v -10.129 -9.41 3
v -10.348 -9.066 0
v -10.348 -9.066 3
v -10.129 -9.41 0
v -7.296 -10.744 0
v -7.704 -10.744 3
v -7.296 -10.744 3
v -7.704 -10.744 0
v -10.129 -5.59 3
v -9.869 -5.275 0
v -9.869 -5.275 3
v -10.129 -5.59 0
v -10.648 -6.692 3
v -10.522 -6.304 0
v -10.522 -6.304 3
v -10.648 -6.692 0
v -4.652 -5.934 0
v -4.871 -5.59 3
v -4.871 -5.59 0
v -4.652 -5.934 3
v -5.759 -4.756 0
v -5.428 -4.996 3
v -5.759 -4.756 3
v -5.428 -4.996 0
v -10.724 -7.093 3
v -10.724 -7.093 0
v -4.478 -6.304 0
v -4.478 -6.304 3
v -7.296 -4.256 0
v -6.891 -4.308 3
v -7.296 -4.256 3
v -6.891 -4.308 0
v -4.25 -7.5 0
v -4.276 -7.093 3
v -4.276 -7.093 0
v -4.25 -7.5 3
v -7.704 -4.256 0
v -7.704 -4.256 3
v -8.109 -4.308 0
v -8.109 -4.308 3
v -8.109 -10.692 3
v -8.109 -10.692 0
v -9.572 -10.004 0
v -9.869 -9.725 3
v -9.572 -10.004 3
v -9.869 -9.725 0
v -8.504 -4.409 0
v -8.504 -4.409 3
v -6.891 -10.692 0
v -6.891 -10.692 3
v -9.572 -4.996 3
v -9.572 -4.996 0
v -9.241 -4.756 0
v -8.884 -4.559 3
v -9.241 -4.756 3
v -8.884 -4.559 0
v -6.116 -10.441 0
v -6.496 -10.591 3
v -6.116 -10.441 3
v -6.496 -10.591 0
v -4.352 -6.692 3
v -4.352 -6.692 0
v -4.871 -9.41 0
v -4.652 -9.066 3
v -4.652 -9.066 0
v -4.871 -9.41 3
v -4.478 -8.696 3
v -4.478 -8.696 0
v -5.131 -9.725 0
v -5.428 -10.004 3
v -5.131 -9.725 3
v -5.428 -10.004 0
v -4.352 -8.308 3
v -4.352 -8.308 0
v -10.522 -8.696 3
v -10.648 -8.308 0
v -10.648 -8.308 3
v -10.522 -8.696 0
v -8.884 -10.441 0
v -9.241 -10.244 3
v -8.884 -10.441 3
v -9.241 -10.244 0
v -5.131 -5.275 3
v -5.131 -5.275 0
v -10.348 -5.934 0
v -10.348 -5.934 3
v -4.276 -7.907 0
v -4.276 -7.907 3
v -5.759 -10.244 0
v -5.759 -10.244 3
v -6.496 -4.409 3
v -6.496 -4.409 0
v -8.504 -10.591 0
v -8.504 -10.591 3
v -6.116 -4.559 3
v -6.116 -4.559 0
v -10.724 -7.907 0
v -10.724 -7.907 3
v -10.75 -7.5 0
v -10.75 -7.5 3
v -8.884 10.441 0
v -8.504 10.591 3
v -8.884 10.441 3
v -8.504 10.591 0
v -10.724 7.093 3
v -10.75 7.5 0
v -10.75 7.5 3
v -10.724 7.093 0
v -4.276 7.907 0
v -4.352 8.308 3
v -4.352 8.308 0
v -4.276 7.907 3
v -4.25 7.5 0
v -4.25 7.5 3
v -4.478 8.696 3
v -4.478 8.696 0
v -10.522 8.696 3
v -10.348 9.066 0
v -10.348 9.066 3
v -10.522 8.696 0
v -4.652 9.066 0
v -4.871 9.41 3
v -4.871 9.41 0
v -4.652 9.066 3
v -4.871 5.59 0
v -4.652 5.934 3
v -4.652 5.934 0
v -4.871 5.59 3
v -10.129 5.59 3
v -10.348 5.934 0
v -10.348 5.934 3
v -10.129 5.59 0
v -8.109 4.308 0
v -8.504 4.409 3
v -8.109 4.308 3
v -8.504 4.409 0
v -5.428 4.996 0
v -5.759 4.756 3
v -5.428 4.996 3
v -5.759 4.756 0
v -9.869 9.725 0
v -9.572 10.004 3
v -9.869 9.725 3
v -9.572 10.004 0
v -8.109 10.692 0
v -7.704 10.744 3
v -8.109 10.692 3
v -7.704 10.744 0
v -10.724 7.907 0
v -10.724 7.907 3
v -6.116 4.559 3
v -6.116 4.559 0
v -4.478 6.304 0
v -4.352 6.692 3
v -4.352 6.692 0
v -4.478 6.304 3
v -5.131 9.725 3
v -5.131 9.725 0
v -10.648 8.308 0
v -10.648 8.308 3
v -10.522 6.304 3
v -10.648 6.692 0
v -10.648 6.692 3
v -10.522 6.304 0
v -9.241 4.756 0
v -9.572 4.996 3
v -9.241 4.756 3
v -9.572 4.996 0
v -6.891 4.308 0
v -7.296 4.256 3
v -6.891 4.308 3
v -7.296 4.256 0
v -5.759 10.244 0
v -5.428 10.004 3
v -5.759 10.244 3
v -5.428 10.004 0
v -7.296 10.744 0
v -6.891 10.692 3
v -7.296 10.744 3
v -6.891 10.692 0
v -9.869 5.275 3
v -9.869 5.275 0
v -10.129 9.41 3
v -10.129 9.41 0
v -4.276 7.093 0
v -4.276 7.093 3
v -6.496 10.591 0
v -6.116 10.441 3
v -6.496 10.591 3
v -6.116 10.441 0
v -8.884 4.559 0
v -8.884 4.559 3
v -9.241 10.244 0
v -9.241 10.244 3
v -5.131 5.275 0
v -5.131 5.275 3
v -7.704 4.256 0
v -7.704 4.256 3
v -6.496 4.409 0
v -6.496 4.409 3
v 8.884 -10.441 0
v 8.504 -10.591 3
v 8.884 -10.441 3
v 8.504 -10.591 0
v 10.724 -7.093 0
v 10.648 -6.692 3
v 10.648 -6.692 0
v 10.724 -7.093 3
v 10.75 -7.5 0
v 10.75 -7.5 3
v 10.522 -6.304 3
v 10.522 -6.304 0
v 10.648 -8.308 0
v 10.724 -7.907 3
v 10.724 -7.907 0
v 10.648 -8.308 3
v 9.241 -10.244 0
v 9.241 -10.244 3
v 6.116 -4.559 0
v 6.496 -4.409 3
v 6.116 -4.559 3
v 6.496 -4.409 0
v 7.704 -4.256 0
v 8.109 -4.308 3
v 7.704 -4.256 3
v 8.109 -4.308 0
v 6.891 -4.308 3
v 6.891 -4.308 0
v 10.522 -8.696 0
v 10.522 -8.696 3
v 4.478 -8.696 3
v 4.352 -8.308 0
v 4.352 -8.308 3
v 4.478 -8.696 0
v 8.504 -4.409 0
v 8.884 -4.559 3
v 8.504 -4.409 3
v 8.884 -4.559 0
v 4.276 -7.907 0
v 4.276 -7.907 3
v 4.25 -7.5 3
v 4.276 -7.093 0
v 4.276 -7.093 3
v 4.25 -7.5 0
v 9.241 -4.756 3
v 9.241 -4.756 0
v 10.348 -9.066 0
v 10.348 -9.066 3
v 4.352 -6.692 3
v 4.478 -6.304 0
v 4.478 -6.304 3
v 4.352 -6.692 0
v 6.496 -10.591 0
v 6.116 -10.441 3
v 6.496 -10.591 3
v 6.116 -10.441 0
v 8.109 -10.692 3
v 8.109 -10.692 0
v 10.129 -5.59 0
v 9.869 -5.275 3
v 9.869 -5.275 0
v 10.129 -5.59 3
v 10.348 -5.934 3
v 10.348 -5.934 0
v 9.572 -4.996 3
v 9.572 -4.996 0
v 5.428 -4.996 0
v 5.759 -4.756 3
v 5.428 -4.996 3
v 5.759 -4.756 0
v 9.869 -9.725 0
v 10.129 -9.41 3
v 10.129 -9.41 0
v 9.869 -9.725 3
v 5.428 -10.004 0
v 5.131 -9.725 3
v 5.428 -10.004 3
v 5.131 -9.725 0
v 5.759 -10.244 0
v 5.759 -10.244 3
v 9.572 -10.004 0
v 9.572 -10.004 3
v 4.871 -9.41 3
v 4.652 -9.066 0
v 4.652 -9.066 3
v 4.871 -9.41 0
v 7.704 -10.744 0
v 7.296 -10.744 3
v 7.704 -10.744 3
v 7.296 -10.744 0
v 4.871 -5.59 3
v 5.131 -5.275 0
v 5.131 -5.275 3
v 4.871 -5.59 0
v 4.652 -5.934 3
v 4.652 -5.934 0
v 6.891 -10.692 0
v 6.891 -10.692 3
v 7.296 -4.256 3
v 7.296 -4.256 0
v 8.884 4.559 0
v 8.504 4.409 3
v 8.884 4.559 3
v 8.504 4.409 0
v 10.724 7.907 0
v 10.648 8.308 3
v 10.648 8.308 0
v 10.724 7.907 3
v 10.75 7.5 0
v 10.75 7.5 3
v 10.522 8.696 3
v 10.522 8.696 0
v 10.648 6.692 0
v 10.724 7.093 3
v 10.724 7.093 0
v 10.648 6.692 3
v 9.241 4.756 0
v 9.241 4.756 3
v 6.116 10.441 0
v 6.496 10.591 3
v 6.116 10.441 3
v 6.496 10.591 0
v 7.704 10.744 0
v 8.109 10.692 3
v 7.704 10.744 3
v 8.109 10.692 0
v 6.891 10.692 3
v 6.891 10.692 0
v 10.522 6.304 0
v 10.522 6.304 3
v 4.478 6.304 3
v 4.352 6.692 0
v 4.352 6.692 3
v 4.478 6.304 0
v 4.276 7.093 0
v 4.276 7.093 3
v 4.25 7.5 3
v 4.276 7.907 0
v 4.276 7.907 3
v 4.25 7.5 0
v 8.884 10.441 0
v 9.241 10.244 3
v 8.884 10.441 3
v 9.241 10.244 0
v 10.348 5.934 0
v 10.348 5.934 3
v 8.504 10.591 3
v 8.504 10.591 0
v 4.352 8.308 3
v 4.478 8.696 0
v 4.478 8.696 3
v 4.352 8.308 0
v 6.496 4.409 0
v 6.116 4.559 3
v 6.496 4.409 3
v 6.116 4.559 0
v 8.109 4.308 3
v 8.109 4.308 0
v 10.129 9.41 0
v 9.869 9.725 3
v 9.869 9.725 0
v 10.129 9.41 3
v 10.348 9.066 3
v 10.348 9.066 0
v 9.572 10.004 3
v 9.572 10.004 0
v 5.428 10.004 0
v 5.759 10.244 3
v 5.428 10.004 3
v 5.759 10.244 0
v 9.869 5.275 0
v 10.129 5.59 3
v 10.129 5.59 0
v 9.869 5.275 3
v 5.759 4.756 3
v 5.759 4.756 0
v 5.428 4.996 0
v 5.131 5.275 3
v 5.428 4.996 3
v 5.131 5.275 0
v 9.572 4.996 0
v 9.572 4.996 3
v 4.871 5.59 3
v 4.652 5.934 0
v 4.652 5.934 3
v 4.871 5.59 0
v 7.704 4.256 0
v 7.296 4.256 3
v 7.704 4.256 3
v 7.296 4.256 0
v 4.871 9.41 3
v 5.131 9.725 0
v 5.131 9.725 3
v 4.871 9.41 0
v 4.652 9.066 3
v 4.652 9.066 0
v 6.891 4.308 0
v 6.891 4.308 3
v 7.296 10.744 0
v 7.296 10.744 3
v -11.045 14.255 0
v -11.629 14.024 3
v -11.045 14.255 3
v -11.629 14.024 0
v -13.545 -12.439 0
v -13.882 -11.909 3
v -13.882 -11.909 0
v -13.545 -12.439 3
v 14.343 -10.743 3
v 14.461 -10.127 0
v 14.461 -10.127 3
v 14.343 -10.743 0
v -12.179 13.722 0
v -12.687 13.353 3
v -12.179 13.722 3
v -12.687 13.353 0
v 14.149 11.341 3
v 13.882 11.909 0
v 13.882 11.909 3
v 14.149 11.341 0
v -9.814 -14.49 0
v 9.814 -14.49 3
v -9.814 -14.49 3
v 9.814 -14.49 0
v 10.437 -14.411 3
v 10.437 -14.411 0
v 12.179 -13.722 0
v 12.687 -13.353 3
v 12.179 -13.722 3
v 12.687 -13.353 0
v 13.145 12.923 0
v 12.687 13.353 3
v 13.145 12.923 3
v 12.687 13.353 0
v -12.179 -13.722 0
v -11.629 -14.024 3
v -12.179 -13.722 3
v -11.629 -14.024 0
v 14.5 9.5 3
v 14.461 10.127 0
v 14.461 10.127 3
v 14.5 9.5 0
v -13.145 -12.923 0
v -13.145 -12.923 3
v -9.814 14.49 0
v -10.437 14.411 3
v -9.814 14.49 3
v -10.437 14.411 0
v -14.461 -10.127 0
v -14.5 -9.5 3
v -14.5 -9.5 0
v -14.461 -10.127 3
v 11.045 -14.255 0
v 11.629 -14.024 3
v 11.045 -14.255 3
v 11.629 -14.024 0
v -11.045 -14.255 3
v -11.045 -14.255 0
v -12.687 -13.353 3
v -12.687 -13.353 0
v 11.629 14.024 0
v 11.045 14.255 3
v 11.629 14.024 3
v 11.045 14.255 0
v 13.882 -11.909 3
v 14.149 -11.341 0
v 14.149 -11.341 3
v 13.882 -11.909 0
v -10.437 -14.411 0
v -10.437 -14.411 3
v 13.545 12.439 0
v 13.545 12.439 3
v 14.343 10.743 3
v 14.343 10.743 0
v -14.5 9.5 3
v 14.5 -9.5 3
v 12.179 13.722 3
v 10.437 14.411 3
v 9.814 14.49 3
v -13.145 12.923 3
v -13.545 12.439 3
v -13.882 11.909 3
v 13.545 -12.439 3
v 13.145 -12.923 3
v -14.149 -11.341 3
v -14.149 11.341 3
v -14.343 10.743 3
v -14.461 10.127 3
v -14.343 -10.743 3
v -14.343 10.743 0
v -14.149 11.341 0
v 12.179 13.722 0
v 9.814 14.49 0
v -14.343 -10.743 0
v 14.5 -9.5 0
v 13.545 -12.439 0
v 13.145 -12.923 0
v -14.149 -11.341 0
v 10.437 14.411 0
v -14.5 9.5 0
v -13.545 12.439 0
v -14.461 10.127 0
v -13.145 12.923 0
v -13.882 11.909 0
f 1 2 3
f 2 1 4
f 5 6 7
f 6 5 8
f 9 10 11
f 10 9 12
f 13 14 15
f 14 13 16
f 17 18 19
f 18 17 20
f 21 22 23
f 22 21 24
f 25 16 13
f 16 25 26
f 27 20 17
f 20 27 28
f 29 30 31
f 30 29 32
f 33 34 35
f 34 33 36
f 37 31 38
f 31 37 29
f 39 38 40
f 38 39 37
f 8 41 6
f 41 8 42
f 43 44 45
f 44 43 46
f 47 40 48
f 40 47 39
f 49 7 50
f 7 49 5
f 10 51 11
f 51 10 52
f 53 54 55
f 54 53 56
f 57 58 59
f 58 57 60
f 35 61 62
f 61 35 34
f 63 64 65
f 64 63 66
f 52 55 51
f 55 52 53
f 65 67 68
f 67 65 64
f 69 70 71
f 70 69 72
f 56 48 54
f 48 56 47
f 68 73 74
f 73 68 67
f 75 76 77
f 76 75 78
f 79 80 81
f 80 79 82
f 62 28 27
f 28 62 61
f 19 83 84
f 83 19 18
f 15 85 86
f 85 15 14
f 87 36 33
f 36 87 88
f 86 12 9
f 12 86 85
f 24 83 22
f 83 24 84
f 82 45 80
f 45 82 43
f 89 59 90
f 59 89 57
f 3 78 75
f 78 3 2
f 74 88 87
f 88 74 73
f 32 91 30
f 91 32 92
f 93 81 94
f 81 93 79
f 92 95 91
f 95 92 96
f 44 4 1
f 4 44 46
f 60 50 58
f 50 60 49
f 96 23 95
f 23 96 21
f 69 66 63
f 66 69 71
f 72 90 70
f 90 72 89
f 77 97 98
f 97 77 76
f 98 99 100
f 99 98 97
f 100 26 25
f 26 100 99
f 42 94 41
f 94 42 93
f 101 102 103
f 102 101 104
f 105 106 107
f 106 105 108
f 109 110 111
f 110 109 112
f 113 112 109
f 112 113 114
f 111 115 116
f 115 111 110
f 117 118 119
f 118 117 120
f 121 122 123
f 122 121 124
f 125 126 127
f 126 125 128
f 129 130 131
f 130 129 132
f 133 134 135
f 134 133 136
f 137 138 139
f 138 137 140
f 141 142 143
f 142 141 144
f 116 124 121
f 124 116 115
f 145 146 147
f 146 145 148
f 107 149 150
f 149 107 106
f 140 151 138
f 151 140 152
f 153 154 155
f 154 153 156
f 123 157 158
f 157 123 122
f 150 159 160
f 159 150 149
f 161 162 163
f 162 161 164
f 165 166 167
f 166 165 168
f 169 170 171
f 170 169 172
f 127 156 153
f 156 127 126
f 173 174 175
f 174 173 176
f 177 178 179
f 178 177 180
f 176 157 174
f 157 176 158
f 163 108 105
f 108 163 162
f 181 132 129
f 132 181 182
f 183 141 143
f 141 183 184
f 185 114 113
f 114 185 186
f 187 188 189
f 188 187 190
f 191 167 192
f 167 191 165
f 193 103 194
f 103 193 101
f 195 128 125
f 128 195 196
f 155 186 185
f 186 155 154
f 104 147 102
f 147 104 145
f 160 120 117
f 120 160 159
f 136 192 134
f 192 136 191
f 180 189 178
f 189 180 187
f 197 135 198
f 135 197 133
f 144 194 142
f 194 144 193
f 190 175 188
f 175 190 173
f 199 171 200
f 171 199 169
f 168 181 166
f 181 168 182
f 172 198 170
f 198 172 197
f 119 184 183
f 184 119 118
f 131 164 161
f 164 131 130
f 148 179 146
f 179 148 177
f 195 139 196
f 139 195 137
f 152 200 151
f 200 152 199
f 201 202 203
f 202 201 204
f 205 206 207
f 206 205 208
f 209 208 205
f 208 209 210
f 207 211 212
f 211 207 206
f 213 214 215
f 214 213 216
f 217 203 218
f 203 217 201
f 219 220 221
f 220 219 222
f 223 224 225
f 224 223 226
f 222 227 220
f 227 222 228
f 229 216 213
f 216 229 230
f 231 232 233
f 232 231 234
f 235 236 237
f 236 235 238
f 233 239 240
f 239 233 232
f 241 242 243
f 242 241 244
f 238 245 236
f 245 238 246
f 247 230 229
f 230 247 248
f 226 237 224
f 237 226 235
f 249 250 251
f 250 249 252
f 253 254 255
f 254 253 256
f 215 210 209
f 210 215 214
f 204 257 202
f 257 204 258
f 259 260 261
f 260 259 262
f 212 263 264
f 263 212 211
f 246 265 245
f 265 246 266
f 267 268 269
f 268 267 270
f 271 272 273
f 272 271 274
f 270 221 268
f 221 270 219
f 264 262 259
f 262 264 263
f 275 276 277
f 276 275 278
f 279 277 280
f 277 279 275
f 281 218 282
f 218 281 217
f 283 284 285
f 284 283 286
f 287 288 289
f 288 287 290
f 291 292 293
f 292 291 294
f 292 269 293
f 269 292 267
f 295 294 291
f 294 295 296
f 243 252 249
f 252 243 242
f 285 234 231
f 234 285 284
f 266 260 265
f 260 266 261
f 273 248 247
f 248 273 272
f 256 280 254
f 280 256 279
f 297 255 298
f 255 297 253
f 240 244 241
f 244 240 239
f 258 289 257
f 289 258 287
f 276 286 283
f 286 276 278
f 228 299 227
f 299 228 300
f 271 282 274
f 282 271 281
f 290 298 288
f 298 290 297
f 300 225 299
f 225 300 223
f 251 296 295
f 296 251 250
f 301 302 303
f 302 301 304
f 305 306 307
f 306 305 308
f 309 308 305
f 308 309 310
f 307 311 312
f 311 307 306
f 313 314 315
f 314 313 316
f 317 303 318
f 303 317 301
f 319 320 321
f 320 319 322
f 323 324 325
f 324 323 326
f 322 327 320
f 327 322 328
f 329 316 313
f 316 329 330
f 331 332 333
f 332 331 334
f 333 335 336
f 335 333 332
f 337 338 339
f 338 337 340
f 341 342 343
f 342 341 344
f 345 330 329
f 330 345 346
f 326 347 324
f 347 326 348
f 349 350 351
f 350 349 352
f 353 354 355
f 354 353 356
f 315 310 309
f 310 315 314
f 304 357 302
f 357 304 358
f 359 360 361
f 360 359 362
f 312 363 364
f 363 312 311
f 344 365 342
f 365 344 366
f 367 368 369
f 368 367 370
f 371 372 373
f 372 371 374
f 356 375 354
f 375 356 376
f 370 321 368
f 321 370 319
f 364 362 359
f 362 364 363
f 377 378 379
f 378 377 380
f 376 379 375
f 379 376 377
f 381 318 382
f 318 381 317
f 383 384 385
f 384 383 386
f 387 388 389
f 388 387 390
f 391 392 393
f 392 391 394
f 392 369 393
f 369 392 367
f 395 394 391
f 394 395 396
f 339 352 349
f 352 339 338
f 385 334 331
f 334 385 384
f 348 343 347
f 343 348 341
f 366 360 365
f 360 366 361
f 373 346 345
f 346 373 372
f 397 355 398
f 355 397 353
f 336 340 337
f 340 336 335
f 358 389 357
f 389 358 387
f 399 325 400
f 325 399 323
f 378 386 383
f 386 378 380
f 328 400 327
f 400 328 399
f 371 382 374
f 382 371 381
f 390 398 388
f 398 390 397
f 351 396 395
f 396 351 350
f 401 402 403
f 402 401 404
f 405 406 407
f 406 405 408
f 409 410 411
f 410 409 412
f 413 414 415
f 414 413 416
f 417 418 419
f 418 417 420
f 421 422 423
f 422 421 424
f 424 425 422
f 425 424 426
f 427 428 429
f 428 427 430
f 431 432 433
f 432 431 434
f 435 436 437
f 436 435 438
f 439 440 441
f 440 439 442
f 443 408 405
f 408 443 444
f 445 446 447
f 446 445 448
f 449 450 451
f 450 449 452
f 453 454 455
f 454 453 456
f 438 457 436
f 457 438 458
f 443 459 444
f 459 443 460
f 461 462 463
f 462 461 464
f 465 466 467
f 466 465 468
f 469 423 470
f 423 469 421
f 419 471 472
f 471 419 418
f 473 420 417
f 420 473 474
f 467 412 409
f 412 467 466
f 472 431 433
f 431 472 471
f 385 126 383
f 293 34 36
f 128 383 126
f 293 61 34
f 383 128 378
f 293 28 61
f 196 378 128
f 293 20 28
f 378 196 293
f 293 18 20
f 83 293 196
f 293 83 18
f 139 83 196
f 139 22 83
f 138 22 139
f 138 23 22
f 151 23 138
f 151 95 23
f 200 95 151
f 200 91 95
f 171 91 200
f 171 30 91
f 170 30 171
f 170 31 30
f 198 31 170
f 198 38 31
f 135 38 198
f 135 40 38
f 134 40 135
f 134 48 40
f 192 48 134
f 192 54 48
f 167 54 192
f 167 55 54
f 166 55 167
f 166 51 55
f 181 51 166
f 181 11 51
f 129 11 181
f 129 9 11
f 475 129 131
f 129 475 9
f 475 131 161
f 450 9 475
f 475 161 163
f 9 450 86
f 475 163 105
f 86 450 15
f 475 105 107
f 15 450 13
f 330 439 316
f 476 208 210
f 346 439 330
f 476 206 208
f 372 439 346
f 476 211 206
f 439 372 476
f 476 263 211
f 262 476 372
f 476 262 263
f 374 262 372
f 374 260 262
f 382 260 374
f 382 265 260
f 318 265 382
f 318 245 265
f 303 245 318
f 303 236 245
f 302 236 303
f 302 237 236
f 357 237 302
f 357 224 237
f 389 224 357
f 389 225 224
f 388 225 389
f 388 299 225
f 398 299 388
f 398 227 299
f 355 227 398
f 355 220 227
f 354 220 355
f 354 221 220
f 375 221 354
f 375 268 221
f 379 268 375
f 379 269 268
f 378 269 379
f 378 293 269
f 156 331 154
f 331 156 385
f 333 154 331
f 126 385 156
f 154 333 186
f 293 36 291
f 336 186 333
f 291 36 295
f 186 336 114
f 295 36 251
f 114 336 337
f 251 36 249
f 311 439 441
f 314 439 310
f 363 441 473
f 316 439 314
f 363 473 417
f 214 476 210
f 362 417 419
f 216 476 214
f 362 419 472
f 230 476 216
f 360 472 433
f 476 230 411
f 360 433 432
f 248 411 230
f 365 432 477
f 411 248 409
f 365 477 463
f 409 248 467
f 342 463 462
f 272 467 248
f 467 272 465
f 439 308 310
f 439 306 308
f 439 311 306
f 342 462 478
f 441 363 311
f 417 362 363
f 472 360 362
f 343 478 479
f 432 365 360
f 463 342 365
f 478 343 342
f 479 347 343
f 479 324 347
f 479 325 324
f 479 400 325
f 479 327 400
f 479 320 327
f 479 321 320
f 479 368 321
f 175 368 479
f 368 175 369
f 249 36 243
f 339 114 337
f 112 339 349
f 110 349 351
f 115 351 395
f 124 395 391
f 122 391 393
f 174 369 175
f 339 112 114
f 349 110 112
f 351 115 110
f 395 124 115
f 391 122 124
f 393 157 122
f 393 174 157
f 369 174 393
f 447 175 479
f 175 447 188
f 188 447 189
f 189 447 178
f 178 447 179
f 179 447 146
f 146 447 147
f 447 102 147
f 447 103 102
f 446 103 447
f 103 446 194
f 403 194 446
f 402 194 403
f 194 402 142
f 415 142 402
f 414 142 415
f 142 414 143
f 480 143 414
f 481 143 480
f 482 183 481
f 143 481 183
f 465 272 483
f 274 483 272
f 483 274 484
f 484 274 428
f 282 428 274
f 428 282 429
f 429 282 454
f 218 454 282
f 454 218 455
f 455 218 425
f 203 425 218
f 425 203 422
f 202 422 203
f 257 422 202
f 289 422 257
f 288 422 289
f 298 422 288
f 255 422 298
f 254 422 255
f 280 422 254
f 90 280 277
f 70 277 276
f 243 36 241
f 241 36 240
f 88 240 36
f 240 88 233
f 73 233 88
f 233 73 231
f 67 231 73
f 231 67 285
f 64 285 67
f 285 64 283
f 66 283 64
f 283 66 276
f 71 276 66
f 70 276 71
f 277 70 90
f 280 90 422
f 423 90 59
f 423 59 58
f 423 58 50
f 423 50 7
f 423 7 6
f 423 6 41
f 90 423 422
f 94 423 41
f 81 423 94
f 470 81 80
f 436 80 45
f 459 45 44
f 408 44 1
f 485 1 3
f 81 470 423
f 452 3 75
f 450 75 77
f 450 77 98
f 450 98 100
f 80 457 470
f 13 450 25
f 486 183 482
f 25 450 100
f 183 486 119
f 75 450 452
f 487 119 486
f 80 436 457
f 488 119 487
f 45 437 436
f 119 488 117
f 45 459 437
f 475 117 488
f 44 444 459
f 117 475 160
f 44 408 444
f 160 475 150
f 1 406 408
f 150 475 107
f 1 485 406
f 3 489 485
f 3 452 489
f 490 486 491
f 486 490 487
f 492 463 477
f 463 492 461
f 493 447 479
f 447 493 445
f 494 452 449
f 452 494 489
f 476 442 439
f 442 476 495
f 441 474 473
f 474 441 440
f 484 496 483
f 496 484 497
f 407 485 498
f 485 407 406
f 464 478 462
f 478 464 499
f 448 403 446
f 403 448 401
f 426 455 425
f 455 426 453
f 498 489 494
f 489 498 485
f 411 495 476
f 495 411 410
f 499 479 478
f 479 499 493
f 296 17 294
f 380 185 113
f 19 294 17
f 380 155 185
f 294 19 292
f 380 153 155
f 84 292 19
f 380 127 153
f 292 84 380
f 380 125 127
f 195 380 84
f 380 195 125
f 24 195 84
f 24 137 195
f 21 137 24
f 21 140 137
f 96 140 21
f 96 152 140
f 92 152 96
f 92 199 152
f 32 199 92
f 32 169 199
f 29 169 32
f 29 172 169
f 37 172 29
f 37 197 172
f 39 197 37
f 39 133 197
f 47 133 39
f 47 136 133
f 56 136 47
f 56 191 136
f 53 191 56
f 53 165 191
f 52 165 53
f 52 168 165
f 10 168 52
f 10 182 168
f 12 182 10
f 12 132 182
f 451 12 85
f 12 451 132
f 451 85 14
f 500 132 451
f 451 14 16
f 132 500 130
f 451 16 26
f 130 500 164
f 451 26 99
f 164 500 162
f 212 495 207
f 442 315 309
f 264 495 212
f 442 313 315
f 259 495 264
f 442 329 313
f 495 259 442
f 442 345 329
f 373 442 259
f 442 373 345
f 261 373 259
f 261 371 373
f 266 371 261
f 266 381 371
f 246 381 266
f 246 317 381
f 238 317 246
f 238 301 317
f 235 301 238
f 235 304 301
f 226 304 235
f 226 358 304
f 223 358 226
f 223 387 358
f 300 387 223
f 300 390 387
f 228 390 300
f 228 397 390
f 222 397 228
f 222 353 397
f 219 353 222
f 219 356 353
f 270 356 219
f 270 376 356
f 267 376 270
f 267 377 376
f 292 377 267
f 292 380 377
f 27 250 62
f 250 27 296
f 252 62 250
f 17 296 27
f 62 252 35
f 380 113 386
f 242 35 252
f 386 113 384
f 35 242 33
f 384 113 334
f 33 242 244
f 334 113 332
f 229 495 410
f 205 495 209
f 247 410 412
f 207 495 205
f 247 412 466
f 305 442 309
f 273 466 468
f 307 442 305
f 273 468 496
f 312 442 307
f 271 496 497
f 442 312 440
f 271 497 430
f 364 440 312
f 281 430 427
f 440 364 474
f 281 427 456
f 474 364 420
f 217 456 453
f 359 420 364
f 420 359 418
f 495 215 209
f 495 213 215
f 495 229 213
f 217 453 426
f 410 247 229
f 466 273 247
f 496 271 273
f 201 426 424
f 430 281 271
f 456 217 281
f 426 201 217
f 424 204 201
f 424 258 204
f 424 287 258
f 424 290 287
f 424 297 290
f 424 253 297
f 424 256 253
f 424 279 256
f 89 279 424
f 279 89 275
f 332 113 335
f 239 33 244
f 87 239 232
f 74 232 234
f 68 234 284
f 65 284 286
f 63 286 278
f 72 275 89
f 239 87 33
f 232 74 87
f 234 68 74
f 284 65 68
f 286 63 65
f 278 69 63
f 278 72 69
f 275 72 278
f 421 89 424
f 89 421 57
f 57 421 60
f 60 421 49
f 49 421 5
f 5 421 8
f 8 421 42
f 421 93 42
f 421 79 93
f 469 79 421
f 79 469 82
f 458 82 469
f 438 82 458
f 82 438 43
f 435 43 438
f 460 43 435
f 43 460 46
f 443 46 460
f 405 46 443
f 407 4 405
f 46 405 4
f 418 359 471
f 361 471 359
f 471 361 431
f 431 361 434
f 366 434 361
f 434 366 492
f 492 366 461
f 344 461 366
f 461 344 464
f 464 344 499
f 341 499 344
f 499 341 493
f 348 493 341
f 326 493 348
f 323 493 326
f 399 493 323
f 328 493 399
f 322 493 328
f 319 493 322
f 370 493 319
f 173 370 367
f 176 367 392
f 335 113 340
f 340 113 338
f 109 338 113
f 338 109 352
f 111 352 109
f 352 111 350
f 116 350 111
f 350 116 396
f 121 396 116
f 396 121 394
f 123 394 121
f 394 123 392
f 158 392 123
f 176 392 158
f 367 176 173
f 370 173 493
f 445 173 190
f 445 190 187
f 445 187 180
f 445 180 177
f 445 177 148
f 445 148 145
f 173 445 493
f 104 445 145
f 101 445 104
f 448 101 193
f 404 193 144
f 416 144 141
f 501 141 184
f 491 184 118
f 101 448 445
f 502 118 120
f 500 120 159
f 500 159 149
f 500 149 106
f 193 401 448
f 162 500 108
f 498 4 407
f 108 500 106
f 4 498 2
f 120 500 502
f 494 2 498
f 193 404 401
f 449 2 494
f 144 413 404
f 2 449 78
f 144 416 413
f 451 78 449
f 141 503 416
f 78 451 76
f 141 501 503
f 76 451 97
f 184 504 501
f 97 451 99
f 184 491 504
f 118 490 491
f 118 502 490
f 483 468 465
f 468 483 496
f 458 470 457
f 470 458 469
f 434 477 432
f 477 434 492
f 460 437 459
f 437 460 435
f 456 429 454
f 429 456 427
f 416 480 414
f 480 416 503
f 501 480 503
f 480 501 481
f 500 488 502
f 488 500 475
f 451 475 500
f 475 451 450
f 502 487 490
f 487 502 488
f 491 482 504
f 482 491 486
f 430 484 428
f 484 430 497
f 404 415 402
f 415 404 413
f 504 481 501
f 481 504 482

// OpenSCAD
$fn = 50;


difference() {
	union() {
		hull() {
			translate(v = [-9.5000000000, 9.5000000000, 0]) {
				cylinder(h = 3, r = 5);
			}
			translate(v = [9.5000000000, 9.5000000000, 0]) {
				cylinder(h = 3, r = 5);
			}
			translate(v = [-9.5000000000, -9.5000000000, 0]) {
				cylinder(h = 3, r = 5);
			}
			translate(v = [9.5000000000, -9.5000000000, 0]) {
				cylinder(h = 3, r = 5);
			}
		}
	}
	union() {
		translate(v = [-7.5000000000, -7.5000000000, -100.0000000000]) {
			cylinder(h = 200, r = 3.2500000000);
		}
		translate(v = [-7.5000000000, 7.5000000000, -100.0000000000]) {
			cylinder(h = 200, r = 3.2500000000);
		}
		translate(v = [7.5000000000, -7.5000000000, -100.0000000000]) {
			cylinder(h = 200, r = 3.2500000000);
		}
		translate(v = [7.5000000000, 7.5000000000, -100.0000000000]) {
			cylinder(h = 200, r = 3.2500000000);
		}
	}
}
